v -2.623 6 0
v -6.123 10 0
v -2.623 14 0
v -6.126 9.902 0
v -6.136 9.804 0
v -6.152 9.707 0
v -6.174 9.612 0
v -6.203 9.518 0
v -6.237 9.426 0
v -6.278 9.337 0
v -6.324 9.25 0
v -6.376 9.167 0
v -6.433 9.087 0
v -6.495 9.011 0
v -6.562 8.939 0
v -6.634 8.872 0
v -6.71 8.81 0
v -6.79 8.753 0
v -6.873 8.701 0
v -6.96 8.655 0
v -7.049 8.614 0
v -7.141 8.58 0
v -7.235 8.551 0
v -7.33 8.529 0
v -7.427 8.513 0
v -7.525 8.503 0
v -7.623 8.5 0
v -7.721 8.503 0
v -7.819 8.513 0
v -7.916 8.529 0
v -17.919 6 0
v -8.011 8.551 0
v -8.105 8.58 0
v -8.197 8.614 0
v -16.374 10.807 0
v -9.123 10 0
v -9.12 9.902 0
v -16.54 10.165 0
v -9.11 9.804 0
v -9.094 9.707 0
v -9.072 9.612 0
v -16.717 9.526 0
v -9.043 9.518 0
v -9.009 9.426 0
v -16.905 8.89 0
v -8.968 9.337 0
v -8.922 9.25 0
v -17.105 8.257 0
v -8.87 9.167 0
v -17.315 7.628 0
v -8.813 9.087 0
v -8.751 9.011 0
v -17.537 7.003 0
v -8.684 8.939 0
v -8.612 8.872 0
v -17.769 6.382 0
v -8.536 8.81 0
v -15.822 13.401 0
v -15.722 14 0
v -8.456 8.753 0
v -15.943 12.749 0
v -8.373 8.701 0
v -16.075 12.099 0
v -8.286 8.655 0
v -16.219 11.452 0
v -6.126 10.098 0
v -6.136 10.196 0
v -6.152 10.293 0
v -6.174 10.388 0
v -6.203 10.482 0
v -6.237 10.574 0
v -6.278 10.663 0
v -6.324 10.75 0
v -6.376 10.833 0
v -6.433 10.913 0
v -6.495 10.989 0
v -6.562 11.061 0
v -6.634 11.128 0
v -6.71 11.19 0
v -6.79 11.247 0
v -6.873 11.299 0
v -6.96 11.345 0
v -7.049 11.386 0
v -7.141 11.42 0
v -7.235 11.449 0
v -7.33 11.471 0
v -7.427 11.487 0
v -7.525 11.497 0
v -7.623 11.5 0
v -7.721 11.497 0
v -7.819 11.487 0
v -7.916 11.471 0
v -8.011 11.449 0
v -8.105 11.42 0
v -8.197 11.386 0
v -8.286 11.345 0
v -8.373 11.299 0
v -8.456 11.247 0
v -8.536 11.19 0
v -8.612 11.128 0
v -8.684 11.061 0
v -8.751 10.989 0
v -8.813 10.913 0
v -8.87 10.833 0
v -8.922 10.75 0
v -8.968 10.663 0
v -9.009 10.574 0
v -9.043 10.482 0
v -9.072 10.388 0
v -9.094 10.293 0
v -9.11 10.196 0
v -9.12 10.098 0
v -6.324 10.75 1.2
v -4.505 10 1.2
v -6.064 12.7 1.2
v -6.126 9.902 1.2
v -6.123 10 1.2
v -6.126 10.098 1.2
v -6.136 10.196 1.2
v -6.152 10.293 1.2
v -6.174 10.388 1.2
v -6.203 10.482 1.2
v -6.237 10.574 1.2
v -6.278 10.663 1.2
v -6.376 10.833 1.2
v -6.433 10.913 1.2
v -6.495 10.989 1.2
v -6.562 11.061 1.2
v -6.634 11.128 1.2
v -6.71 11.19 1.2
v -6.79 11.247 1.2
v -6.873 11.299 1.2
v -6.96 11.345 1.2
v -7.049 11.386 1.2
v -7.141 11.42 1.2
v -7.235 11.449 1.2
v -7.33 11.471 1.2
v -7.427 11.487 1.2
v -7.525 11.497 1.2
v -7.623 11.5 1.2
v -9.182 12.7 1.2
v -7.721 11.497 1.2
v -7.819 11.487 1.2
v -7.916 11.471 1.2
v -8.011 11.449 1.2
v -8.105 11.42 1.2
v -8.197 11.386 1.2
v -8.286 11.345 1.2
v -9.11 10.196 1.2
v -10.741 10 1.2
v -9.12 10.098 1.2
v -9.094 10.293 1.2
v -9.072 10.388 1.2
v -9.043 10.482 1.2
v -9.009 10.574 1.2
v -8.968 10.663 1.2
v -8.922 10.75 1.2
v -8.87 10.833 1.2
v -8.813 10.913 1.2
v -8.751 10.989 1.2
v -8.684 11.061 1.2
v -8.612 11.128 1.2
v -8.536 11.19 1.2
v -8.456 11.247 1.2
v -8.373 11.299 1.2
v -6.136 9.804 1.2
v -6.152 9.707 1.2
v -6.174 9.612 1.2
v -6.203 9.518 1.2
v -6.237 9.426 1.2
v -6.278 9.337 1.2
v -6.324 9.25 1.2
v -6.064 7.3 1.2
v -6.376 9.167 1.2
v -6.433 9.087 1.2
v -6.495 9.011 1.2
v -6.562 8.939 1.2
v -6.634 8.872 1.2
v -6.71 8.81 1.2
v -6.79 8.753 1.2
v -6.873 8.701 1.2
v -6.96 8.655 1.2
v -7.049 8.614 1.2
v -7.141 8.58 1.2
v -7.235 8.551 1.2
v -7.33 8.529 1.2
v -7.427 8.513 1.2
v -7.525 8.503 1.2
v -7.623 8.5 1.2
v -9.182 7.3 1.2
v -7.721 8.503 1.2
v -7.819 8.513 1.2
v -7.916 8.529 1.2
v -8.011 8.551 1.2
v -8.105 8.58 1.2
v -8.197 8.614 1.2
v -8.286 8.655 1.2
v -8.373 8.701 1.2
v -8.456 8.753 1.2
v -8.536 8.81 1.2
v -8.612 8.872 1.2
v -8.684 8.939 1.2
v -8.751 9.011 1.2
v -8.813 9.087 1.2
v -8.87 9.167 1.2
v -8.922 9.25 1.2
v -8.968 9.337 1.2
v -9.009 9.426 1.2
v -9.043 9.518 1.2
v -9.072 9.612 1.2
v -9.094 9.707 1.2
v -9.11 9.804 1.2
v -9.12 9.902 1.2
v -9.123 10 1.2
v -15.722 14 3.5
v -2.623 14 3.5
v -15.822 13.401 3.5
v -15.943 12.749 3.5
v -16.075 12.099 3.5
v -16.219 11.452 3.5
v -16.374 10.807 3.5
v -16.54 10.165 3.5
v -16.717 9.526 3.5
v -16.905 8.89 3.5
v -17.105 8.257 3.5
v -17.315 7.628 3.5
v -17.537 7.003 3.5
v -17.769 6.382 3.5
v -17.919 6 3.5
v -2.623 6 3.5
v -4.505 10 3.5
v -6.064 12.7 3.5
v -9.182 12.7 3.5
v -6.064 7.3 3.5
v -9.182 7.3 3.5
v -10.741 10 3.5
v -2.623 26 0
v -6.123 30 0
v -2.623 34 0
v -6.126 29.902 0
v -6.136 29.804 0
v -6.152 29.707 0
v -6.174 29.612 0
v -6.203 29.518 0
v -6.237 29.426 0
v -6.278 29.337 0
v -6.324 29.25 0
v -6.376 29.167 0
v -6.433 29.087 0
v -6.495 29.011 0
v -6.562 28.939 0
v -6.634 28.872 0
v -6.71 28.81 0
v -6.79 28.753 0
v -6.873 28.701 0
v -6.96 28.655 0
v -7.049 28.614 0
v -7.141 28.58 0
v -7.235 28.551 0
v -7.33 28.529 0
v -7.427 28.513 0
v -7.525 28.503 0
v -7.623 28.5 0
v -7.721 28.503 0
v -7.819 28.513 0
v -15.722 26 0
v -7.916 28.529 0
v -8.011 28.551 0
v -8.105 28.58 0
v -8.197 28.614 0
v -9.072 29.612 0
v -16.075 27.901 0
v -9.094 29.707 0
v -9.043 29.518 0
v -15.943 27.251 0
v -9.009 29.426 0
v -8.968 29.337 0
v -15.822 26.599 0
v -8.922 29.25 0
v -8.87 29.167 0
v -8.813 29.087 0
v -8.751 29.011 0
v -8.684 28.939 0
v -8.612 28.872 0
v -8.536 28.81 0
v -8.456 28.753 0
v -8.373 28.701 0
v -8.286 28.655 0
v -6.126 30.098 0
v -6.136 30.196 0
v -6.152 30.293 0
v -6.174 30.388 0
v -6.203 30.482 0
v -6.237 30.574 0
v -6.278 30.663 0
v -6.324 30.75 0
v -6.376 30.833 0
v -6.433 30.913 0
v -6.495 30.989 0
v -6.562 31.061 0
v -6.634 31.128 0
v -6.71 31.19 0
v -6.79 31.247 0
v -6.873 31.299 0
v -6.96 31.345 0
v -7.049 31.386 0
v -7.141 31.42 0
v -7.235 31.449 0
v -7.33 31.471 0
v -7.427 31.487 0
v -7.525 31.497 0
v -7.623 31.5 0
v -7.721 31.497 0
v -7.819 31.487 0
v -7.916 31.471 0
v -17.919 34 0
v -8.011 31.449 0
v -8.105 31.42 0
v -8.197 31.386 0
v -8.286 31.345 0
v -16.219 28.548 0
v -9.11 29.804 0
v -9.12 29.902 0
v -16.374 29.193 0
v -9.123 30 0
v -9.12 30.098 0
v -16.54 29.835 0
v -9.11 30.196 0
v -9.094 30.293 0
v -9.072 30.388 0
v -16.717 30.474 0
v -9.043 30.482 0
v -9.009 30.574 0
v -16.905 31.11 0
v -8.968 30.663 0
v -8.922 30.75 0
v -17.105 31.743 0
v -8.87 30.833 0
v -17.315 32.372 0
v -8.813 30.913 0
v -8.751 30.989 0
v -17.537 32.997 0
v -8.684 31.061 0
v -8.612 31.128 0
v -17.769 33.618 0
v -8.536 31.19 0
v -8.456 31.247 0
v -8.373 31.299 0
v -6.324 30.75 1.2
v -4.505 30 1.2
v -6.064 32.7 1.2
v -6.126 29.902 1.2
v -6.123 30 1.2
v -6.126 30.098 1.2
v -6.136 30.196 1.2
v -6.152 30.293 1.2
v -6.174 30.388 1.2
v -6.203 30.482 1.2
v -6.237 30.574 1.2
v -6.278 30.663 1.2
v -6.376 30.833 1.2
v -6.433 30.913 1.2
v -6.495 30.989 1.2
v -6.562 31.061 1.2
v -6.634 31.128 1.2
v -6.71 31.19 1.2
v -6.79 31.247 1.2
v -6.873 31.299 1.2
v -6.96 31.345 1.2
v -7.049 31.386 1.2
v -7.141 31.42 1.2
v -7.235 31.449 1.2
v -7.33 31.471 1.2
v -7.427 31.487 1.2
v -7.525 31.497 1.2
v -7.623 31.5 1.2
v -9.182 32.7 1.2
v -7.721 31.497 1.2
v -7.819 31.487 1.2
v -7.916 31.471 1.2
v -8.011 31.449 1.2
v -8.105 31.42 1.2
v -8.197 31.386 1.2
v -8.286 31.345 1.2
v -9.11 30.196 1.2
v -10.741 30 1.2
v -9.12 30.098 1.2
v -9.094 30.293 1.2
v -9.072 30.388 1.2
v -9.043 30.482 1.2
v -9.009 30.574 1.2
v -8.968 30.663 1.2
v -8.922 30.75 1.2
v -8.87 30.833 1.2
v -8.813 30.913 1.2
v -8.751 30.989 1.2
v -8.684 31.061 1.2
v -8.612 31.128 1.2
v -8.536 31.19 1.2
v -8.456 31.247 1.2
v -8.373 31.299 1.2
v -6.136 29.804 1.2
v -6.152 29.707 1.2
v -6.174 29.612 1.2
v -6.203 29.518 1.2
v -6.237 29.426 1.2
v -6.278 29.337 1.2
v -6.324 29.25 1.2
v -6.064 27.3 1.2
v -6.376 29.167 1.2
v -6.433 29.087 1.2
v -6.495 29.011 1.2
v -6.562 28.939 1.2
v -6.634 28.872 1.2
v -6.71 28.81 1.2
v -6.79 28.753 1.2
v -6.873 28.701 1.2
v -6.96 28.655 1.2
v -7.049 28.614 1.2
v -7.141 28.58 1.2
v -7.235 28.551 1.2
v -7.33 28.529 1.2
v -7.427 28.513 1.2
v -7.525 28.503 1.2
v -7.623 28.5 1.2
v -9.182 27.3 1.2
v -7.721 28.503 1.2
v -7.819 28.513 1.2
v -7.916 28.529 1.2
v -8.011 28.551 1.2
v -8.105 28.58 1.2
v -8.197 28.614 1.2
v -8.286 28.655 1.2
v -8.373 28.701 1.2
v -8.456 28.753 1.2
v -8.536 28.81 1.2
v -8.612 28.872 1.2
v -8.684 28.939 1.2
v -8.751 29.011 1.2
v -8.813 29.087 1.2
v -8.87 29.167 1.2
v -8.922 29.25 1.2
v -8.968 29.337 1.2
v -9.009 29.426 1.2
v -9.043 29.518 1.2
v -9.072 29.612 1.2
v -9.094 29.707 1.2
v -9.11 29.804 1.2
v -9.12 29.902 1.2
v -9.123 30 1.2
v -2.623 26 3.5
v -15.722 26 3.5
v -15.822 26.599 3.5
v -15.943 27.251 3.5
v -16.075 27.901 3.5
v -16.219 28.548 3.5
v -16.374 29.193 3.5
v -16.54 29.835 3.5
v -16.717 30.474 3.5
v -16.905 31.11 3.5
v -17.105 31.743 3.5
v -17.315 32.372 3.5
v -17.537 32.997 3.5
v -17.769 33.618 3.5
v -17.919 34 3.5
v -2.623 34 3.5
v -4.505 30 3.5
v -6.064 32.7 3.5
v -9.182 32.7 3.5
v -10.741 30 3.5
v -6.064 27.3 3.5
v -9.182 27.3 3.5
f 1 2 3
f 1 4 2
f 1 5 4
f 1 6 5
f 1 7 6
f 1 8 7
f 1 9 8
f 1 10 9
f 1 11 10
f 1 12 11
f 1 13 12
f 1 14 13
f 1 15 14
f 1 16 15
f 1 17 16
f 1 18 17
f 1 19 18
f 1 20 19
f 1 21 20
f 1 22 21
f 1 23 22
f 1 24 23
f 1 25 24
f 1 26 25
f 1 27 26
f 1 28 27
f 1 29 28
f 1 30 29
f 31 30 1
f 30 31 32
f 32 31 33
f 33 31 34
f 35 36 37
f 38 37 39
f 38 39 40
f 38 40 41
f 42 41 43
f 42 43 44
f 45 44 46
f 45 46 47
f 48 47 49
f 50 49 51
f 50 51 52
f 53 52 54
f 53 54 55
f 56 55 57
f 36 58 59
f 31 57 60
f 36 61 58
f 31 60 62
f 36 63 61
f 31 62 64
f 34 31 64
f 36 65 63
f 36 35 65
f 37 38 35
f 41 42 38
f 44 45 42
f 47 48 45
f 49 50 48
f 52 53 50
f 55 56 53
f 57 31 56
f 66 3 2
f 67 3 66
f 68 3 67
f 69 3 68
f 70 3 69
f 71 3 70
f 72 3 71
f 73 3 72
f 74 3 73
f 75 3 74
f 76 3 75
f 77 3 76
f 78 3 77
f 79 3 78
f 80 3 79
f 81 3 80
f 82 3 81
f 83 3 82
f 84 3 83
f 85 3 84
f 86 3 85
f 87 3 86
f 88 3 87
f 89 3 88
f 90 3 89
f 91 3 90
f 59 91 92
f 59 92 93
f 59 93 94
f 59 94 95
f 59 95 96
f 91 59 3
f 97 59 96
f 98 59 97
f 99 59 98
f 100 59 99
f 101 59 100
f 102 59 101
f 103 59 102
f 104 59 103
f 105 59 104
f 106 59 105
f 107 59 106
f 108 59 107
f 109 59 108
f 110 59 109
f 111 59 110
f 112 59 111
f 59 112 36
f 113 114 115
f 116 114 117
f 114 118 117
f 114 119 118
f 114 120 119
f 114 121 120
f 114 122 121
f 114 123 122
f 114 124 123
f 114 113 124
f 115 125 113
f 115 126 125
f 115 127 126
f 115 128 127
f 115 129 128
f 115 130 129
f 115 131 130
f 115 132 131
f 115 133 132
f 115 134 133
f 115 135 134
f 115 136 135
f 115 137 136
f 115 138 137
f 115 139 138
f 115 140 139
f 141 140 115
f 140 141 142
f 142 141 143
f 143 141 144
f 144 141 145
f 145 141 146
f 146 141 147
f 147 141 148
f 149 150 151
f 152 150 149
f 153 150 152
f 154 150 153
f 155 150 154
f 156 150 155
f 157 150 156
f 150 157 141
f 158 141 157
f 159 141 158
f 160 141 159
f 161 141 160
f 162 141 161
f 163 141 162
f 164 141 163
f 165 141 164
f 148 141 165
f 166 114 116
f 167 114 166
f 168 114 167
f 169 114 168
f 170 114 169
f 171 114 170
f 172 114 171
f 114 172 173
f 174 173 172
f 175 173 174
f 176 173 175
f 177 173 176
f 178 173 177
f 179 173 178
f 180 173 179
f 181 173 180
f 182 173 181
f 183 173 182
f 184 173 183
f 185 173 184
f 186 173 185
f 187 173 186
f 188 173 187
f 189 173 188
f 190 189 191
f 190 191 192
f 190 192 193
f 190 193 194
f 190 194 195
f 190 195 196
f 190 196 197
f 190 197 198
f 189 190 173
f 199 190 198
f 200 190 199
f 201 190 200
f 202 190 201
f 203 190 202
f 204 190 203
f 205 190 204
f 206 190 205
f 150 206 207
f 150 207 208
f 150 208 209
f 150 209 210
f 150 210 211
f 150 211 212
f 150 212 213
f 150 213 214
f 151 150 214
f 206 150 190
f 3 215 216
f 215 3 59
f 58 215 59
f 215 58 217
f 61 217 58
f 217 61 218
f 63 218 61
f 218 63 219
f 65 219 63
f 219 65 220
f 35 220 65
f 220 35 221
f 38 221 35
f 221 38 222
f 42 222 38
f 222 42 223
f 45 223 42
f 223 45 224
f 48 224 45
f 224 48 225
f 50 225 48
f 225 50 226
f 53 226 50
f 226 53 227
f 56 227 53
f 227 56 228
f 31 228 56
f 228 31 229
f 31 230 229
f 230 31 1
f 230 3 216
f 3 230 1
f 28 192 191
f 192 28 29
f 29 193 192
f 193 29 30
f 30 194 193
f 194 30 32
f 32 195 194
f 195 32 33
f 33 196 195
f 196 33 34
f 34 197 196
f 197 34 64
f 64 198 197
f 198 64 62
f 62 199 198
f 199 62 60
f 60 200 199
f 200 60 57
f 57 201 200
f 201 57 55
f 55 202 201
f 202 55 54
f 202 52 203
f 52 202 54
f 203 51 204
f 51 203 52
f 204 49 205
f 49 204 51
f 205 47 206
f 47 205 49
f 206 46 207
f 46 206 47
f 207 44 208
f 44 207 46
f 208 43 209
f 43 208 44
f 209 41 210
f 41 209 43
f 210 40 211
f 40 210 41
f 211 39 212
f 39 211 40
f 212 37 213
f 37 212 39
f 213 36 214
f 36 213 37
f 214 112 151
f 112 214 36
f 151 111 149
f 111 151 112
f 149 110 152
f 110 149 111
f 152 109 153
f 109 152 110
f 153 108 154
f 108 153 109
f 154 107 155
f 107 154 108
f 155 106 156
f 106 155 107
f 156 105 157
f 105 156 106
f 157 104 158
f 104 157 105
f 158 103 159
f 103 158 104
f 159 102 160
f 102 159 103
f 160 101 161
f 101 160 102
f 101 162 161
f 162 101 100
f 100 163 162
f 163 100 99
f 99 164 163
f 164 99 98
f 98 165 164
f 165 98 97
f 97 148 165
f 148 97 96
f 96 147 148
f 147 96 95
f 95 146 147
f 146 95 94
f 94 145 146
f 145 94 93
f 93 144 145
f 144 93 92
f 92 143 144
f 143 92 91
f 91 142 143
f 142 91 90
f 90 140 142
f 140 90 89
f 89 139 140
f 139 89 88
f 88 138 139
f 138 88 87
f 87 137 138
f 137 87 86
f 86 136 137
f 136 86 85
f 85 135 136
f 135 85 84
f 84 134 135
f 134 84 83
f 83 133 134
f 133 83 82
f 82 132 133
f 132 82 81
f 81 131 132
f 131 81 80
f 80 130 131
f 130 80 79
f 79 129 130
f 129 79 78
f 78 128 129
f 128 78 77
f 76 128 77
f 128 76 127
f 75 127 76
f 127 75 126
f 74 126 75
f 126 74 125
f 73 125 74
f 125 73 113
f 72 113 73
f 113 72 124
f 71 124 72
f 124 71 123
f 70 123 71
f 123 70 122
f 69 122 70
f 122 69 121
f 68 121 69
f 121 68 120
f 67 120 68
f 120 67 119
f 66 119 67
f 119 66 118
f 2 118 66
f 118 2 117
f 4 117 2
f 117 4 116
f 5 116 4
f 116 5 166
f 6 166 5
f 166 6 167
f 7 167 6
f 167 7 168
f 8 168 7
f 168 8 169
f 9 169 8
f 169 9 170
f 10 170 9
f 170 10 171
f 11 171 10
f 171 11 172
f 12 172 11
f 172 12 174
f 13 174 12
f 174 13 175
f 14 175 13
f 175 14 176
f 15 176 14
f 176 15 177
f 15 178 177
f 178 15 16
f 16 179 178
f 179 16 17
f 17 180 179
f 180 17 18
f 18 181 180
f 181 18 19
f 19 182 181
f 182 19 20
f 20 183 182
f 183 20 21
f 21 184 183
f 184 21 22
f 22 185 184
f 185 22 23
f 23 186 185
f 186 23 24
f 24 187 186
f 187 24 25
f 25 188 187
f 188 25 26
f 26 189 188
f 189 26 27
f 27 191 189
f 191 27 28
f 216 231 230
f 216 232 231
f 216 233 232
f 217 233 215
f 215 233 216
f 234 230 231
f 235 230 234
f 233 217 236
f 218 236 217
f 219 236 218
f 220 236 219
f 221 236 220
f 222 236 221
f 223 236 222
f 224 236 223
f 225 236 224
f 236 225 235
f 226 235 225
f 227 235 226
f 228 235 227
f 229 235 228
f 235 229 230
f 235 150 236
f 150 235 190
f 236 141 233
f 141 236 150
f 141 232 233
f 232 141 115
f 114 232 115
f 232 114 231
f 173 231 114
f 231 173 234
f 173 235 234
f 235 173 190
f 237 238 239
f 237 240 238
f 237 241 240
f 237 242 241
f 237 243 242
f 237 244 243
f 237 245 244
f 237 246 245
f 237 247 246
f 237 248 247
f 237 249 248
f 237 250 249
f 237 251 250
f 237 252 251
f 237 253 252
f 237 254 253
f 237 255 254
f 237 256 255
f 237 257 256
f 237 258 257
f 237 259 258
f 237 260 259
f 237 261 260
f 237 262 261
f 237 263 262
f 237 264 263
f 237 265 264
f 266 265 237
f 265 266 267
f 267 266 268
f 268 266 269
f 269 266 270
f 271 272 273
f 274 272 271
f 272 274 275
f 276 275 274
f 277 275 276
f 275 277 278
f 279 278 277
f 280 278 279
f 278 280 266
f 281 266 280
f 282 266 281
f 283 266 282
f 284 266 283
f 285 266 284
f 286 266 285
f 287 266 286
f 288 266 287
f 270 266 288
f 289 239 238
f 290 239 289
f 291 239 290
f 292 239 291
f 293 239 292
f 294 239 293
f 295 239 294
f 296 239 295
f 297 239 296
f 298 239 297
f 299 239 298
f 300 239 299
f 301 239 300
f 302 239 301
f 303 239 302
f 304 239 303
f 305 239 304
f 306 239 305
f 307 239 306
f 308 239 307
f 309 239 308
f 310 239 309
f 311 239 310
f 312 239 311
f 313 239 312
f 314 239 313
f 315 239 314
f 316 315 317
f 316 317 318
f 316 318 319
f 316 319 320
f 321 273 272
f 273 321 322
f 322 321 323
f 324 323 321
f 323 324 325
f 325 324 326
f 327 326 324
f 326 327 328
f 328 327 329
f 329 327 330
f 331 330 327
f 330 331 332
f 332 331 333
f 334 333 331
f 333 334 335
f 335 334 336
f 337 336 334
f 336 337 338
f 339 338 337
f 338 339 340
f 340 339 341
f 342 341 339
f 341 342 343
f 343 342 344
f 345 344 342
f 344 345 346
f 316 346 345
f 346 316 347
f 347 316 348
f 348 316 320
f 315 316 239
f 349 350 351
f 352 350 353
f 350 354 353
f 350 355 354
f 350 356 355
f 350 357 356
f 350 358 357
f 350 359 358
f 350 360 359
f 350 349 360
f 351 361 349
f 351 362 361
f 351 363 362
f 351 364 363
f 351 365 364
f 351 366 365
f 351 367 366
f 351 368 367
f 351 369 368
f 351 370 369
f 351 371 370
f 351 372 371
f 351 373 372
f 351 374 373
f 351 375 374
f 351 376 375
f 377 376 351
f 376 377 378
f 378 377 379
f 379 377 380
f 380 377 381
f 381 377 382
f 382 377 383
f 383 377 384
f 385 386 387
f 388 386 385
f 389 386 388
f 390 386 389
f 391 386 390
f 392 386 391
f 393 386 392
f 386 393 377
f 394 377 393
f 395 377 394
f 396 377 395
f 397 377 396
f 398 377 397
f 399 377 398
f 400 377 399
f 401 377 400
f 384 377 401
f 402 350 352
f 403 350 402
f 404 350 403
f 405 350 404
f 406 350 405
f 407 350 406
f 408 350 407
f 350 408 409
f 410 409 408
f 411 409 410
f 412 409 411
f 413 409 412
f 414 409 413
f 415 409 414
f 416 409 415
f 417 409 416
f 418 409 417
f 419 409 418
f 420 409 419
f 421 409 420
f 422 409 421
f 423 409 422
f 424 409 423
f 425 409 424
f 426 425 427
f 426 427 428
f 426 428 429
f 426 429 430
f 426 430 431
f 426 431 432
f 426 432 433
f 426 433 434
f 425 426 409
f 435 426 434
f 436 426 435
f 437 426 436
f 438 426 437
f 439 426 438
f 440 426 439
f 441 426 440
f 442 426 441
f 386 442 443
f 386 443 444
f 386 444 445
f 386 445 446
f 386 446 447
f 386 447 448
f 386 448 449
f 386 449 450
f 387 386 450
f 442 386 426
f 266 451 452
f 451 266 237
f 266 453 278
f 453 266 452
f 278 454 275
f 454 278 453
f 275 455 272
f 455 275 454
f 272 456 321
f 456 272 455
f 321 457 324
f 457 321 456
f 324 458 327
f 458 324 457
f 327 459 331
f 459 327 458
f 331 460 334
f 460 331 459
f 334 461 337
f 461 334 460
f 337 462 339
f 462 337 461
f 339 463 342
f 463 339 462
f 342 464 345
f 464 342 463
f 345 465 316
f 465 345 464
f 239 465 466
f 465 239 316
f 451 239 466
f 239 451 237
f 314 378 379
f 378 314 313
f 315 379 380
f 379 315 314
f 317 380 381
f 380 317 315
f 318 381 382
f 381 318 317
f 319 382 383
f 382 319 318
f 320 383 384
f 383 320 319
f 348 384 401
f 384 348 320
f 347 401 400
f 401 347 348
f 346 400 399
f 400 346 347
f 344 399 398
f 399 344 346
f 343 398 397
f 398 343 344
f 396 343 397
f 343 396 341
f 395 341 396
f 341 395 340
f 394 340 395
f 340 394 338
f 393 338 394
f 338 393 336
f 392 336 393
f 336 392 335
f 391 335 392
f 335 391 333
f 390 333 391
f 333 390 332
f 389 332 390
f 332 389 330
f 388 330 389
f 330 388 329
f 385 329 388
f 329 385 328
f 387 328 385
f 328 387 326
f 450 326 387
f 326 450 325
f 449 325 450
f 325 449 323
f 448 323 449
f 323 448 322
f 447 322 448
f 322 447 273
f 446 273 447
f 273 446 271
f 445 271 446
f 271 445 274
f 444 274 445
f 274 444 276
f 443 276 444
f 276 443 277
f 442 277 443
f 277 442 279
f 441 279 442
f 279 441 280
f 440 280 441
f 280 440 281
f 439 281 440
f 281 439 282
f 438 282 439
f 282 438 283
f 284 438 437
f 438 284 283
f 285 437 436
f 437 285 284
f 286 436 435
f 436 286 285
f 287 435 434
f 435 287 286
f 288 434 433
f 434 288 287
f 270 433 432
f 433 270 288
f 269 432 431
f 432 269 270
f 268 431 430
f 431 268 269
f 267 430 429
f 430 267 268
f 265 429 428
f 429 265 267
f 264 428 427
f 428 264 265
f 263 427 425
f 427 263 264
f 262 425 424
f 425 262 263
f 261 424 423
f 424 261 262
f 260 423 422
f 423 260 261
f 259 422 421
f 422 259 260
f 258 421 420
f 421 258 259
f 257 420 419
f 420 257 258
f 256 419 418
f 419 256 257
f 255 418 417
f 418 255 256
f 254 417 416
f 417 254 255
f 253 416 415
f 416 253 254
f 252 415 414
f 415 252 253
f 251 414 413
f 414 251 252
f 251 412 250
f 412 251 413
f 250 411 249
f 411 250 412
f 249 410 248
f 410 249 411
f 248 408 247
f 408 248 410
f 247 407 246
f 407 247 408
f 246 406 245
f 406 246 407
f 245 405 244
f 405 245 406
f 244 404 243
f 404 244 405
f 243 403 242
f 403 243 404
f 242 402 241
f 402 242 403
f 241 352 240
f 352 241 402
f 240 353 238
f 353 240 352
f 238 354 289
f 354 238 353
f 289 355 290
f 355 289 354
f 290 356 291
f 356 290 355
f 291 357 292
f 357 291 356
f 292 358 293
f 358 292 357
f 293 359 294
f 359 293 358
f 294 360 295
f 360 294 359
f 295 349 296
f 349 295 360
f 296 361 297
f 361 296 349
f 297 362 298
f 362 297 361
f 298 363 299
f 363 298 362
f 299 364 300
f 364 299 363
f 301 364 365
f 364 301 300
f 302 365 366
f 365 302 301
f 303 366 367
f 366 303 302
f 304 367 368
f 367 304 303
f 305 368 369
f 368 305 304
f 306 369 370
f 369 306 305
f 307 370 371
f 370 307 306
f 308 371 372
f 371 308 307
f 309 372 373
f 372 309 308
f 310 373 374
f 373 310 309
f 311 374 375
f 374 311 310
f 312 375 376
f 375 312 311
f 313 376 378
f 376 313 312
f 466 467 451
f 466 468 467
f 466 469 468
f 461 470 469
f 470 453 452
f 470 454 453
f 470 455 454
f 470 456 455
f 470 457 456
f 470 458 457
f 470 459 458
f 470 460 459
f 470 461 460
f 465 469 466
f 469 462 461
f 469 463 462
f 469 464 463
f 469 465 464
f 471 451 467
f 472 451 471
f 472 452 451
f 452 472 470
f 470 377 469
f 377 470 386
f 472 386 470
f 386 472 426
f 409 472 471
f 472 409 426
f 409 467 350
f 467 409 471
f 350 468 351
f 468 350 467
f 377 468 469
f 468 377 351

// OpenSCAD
// file: ../print_fit.scad
// Print-fit clearances, shared by every printed part's `config="revised"`.
//
// A printed part comes off the machine slightly oversize, so a feature drawn
// line-to-line against what it mates with will not go together. Each mating
// feature is drawn at its mate's nominal size plus or minus one of two
// clearances, per side, chosen by what the mate is:
//
//     FIT_PRESS    a bought part the printed one is seated on, located by
//                  or bonded to: bearings, motors, splines, CF rods, tubes
//                  and strakes
//     FIT_SLIP     another printed part, and every fastener's clearance:
//                  screw holes, nut traps and pockets
//
// A third class is not a fit, because its surfaces never meet:
//
//     FIT_RUN      a gap between two parts that turn past each other and
//                  must never touch, such as a housing and a gear's teeth
//
// The classes, their members and exclusions, and how a machine is qualified
// against these values are owned by specs/007.2 § Print fits; the coupon that
// qualifies them is 950-Tooling/fit_coupon.scad.
//
// Every part `include`s this file, so `-D FIT_SLIP=...` reaches a single
// render, and an edit here retunes every part. `config="previous"` draws at
// zero clearance: it is the reference mesh, and its dist gate measures it.

FIT_SLIP  = 0.15;
FIT_PRESS = 0.05;
FIT_RUN   = 0.50;

// A hole or bore that takes a mate of diameter d, and a pin or shaft that
// goes into one, with clearance c per side.
function fit_bore(d, c) = d + 2 * c;
function fit_pin(d, c) = d - 2 * c;

// The clearances a part draws in configuration cfg: [slip, press, run].
function fit_clearances(cfg) =
    cfg == "previous" ? [0, 0, 0] : [FIT_SLIP, FIT_PRESS, FIT_RUN];
// main file
// #520-003 Nut Holder A and #520-004 Nut Holder B — parametric source.
// Each holder carries the M3 nut one of the two M3 x 46 all-threads (#520-005)
// screws into. It slides into the Ex Gear Mount with its curved face against
// the Mount's bore, which sets which way round it goes (008.7 step 9), and the
// all-thread ties the Mount Top down through it (step 13).
//
//   config = "previous" — a faithful recreation of the reference mesh
//                         (../Reference/meshes/500-ExternalGear/), in that
//                         mesh's frame.
//   config = "revised"  — the same part with its print fits on the nut and
//                         the all-thread.
//
// ONE FILE, TWO PARTS. The two holders are mirror images: the reference holds
// both, side by side, as one HD export. Holder A is the body at y 6 .. 14 of
// that export and Holder B its mirror image about y 20, at y 26 .. 34. The
// names follow the two part numbers' order; nothing in the HD set names them.
// `holder` draws "both", as the reference does (the dist gate measures that,
// and the pair prints on one plate), or "A" or "B" alone in the same place.
//
// FRAME. The reference's: the plate's underside on z = 0, the nut's axis on +Z.
// Each holder is laid out exactly as it stands in the Mount, turned 180 deg
// about z: Mount = rot180(p - BORE_C) + (-0.655, 0), where (-0.655, 0) is the
// Mount bore's centre (520-001). mount_place() applies that.
//
// CONSTRUCTION. Two constant sections, each drawn whole in 2D and extruded
// once (profile per layer):
//
//     plate   z 0 .. 1.2     outline - Ø3 hole
//     trap    z 1.2 .. 3.5   outline - hex nut trap, open on top
//
// The outline is a rectangle whose -x side is the Mount bore's R38 arc, about a
// centre 10 mm off the hole along y, toward the mirror plane. `layer = "plate"`
// or `"trap"` draws that profile in 2D (Holder A, or both), for verification
// against the mesh's section (scadmesh outline; render.rs --verify does this).
//
// Measured from the reference with scadmesh planes/slice/arcs. The feature IDs
// are those of 520-003_ExGearNutHold.view.json:
//
//     ID  feature                     value
//     O1  outline                     x BORE arc .. -2.623, y 6.0 .. 14.0
//     C1  curved face                 R38.000 about (-53.245, 20.000); the
//                                     arc's vertices lie within 0.005 of it
//     T1  thickness                   z 0 .. 3.5
//     H1  all-thread hole             Ø3.000 about (-7.623, 10.000), z 0 .. 1.2
//     N1  nut trap                    hexagon 5.400 across flats, corners on
//                                     +-x, same axis, z 1.2 .. 3.5
//
// The hole's axis lies 5.000 inside the +x face and 4.000 from each side; the
// curved face's centre lies 45.623 along -x from it, as the Mount's all-thread
// holes at (-46.278, +-10) lie from its bore's centre.
//
// FITS (../print_fit.scad), revised only:
//
//     H1, on the M3 all-thread (Ø3.0)                 slip
//     N1, on the M3 nut (DIN 934, 5.5 across flats)   slip
//
// The reference's trap is 5.4 across flats, 0.05 inside the nut per side.

include <../print_fit.scad>

/* [Configuration] */
// Parameter set: previous (reference) or revised
config = "previous"; // [previous, revised]
// Which holder to draw
holder = "both"; // [both, A, B]
// What to draw: the part, or one layer's 2D profile
layer = "part"; // [part, plate, trap]

/* [Hidden] */
$fn = 360;
epsilon = 0.01;

X_FACE    = -2.623;              // O1, the straight face away from the bore
WIDTH     = 8.000;               // O1, y 6 .. 14 for Holder A
HOLE_C    = [-7.623, 10.000];    // H1 and N1 axis, Holder A
BORE_R    = 38.000;              // C1
BORE_C    = [-53.245, 20.000];   // C1's centre; y 20 is the mirror plane between A and B
PLATE_H   = 1.200;               // H1's layer
HEIGHT    = 3.500;               // T1
HOLE_D    = 3.000;               // H1
TRAP_AF   = 5.400;               // N1, across flats
ROD_D     = 3.000;               // the M3 all-thread H1 takes
NUT_AF    = 5.500;               // the M3 nut N1 takes
MOUNT_C   = [-0.655, 0];         // the Mount bore's centre, in the Mount's frame

function hole_d(cfg) = cfg == "previous" ? HOLE_D : fit_bore(ROD_D, fit_clearances(cfg)[0]);
function trap_af(cfg) = cfg == "previous" ? TRAP_AF : fit_bore(NUT_AF, fit_clearances(cfg)[0]);

// For the assembly: the holder's thickness, and Holder A's hole axis.
function nut_holder_height() = HEIGHT;
function nut_holder_hole() = HOLE_C;

// Holder A's outline: its rectangle less the Mount bore's disc.
module outline_2d() {
    difference() {
        translate([BORE_C.x, HOLE_C.y - WIDTH / 2]) square([X_FACE - BORE_C.x, WIDTH]);
        translate(BORE_C) circle(r = BORE_R);
    }
}

module plate_2d(cfg) difference() { outline_2d(); translate(HOLE_C) circle(d = hole_d(cfg), $fn = 96); }

// A hexagon with its corners on +-x.
module trap_2d(cfg) difference() { outline_2d(); translate(HOLE_C) circle(d = trap_af(cfg) / cos(30), $fn = 6); }

module layer_a_2d(l, cfg) { if (l == "plate") plate_2d(cfg); else trap_2d(cfg); }

// The trap's layer laps down into the plate, where the plate is solid round
// the trap, so the trap's floor stays at PLATE_H, where the nut sits.
module nut_holder_a(cfg) {
    linear_extrude(PLATE_H) plate_2d(cfg);
    translate([0, 0, PLATE_H - epsilon]) linear_extrude(HEIGHT - PLATE_H + epsilon) trap_2d(cfg);
}

// Holder B is Holder A's mirror image about the plane between them.
module mirror_b() translate([0, BORE_C.y]) mirror([0, 1, 0]) translate([0, -BORE_C.y]) children();

// One holder, "A" or "B", in the reference's frame.
module nut_holder(which, cfg = config) {
    if (which == "A") nut_holder_a(cfg);
    else mirror_b() nut_holder_a(cfg);
}

// Children drawn in this file's frame, moved to where they stand in the Mount's
// frame (its bore's centre at MOUNT_C), at the Mount's height z0.
module mount_place(z0) translate([MOUNT_C.x, MOUNT_C.y, z0]) rotate(180) translate(-BORE_C) children();

function holders(which) = which == "both" ? ["A", "B"] : [which];

if (layer == "part")
    for (h = holders(holder)) nut_holder(h, config);
else
    for (h = holders(holder))
        if (h == "A") layer_a_2d(layer, config);
        else mirror_b() layer_a_2d(layer, config);
